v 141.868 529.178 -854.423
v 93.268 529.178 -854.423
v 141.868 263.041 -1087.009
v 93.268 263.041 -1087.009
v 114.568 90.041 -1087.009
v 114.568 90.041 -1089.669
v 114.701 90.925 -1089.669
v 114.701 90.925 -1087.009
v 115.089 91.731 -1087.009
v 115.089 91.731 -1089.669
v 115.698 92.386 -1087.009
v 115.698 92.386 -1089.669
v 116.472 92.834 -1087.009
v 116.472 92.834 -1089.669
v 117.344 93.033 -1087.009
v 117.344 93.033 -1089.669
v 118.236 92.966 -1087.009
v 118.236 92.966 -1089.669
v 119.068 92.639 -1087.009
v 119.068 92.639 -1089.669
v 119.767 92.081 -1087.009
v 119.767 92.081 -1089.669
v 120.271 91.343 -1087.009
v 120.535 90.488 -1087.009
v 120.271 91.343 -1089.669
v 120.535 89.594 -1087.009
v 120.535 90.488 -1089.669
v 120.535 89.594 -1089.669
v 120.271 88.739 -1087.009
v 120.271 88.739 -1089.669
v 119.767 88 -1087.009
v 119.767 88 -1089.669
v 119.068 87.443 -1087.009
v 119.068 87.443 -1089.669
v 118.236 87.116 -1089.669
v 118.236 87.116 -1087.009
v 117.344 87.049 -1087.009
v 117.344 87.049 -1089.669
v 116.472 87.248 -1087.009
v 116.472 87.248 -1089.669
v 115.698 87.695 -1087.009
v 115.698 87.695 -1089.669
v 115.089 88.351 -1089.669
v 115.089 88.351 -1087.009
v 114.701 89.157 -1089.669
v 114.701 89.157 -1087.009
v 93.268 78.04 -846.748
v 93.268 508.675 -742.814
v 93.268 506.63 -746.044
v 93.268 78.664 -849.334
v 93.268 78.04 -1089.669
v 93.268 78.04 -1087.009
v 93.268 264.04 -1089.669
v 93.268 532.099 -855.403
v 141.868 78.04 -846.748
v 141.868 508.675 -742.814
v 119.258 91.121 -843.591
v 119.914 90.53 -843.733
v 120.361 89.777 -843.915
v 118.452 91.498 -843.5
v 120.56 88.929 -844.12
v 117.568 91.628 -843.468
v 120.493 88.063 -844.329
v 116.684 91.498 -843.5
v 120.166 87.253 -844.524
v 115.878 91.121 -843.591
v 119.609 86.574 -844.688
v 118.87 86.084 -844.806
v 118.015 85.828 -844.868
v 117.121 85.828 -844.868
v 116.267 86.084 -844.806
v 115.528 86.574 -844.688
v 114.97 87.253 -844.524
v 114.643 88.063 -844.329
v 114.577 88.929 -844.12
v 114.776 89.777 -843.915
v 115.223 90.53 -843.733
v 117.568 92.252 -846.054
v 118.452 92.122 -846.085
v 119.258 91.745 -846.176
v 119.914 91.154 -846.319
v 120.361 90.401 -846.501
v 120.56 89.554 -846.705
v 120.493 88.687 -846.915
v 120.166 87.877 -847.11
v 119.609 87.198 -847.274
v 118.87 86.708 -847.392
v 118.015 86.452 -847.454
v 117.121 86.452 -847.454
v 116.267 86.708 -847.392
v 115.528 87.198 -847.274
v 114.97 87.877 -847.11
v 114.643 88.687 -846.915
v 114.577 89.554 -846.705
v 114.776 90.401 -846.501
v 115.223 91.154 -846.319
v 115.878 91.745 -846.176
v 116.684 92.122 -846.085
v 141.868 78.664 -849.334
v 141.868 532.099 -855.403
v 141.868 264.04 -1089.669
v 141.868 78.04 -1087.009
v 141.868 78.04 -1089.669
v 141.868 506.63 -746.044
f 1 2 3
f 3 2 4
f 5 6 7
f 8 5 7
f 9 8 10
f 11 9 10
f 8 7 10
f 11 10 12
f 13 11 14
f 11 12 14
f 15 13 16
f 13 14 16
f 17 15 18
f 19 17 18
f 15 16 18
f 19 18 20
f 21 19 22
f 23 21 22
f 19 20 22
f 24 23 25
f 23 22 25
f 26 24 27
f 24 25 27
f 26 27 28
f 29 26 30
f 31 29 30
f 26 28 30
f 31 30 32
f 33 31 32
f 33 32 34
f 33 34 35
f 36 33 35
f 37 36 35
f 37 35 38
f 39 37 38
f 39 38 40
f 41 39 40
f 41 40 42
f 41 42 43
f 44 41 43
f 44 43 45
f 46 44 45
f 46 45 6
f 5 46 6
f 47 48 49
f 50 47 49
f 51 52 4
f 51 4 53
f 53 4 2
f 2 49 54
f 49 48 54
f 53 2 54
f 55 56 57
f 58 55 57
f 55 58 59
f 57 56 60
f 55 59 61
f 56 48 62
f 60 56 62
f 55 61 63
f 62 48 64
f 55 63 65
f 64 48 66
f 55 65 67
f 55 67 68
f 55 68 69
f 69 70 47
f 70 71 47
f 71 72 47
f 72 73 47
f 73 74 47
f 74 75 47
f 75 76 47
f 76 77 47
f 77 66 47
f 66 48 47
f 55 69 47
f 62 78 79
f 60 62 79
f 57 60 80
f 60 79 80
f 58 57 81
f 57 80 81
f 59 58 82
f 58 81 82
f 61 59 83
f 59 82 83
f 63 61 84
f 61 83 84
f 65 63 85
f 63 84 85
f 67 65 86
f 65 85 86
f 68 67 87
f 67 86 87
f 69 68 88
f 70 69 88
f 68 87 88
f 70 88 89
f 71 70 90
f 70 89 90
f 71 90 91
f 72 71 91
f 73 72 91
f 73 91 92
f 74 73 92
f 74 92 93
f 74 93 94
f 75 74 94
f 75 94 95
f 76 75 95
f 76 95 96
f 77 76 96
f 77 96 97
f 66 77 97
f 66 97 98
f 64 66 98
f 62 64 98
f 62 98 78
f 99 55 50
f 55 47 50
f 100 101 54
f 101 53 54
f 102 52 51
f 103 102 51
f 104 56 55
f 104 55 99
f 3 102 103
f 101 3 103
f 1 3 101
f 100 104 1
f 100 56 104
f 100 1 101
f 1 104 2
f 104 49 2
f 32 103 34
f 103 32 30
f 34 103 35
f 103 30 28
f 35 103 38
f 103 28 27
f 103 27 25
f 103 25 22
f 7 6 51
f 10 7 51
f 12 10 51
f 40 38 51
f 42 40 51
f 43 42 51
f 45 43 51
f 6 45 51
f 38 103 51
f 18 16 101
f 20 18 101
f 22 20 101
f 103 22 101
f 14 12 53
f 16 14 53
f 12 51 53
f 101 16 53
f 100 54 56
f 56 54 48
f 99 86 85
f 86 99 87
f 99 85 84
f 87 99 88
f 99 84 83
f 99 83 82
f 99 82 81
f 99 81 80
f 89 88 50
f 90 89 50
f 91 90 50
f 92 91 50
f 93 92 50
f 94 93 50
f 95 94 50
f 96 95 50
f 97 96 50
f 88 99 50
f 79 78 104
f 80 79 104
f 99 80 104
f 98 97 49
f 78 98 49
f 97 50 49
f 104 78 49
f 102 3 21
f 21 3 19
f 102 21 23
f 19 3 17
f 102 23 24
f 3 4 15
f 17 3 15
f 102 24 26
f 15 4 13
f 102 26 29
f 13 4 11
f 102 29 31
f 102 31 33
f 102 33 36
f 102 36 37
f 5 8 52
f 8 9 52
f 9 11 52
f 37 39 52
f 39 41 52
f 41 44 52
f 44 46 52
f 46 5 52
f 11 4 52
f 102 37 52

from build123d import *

# Parameters (mm, degrees)
BOSS_EXTRUDE2_DEPTH = 24.3
SKETCH5_R           = 3
CUT_EXTRUDE1_DEPTH  = 10
SKETCH10_R          = 3
CUT_EXTRUDE2_DEPTH  = 10


with BuildPart() as part:
    # Sketch4 → Boss-Extrude2 (new, symmetric)
    with BuildSketch(Plane.ZY.offset(-117.5682)):
        Polygon((-1089.668968128, 78.04), (-1089.668968128, 264.04), (-855.402894198, 532.098588009), (-742.813619106, 508.675199397), (-846.747853315, 78.04), (-849.333608688, 78.664074634), (-746.043555874, 506.630209448), (-854.422864001, 529.177744724), (-1087.008968128, 263.041459529), (-1087.008968128, 78.04), align=None)
    extrude(amount=BOSS_EXTRUDE2_DEPTH, both=True)

    # Sketch5 → Cut-Extrude1 (cut)
    with BuildSketch(Plane(origin=(0, 0, -1089.668968128), x_dir=(-1, 0, 0), z_dir=(0, 0, -1))):
        with Locations((-117.5682, 90.04090214)):
            Circle(SKETCH5_R)
    extrude(amount=-CUT_EXTRUDE1_DEPTH, mode=Mode.SUBTRACT)

    # Sketch10 → Cut-Extrude2 (cut)
    with BuildSketch(Plane(origin=(0, 198.034168105, -820.523517758), x_dir=(-1, 0, 0), z_dir=(0, 0.23461452417479184, -0.9720884862224406))):
        with Locations(Location((-117.5682, -111.819624777, 0), (0, 0, 90))):
            Circle(SKETCH10_R)
    extrude(amount=-CUT_EXTRUDE2_DEPTH, mode=Mode.SUBTRACT)


solid = part.part
